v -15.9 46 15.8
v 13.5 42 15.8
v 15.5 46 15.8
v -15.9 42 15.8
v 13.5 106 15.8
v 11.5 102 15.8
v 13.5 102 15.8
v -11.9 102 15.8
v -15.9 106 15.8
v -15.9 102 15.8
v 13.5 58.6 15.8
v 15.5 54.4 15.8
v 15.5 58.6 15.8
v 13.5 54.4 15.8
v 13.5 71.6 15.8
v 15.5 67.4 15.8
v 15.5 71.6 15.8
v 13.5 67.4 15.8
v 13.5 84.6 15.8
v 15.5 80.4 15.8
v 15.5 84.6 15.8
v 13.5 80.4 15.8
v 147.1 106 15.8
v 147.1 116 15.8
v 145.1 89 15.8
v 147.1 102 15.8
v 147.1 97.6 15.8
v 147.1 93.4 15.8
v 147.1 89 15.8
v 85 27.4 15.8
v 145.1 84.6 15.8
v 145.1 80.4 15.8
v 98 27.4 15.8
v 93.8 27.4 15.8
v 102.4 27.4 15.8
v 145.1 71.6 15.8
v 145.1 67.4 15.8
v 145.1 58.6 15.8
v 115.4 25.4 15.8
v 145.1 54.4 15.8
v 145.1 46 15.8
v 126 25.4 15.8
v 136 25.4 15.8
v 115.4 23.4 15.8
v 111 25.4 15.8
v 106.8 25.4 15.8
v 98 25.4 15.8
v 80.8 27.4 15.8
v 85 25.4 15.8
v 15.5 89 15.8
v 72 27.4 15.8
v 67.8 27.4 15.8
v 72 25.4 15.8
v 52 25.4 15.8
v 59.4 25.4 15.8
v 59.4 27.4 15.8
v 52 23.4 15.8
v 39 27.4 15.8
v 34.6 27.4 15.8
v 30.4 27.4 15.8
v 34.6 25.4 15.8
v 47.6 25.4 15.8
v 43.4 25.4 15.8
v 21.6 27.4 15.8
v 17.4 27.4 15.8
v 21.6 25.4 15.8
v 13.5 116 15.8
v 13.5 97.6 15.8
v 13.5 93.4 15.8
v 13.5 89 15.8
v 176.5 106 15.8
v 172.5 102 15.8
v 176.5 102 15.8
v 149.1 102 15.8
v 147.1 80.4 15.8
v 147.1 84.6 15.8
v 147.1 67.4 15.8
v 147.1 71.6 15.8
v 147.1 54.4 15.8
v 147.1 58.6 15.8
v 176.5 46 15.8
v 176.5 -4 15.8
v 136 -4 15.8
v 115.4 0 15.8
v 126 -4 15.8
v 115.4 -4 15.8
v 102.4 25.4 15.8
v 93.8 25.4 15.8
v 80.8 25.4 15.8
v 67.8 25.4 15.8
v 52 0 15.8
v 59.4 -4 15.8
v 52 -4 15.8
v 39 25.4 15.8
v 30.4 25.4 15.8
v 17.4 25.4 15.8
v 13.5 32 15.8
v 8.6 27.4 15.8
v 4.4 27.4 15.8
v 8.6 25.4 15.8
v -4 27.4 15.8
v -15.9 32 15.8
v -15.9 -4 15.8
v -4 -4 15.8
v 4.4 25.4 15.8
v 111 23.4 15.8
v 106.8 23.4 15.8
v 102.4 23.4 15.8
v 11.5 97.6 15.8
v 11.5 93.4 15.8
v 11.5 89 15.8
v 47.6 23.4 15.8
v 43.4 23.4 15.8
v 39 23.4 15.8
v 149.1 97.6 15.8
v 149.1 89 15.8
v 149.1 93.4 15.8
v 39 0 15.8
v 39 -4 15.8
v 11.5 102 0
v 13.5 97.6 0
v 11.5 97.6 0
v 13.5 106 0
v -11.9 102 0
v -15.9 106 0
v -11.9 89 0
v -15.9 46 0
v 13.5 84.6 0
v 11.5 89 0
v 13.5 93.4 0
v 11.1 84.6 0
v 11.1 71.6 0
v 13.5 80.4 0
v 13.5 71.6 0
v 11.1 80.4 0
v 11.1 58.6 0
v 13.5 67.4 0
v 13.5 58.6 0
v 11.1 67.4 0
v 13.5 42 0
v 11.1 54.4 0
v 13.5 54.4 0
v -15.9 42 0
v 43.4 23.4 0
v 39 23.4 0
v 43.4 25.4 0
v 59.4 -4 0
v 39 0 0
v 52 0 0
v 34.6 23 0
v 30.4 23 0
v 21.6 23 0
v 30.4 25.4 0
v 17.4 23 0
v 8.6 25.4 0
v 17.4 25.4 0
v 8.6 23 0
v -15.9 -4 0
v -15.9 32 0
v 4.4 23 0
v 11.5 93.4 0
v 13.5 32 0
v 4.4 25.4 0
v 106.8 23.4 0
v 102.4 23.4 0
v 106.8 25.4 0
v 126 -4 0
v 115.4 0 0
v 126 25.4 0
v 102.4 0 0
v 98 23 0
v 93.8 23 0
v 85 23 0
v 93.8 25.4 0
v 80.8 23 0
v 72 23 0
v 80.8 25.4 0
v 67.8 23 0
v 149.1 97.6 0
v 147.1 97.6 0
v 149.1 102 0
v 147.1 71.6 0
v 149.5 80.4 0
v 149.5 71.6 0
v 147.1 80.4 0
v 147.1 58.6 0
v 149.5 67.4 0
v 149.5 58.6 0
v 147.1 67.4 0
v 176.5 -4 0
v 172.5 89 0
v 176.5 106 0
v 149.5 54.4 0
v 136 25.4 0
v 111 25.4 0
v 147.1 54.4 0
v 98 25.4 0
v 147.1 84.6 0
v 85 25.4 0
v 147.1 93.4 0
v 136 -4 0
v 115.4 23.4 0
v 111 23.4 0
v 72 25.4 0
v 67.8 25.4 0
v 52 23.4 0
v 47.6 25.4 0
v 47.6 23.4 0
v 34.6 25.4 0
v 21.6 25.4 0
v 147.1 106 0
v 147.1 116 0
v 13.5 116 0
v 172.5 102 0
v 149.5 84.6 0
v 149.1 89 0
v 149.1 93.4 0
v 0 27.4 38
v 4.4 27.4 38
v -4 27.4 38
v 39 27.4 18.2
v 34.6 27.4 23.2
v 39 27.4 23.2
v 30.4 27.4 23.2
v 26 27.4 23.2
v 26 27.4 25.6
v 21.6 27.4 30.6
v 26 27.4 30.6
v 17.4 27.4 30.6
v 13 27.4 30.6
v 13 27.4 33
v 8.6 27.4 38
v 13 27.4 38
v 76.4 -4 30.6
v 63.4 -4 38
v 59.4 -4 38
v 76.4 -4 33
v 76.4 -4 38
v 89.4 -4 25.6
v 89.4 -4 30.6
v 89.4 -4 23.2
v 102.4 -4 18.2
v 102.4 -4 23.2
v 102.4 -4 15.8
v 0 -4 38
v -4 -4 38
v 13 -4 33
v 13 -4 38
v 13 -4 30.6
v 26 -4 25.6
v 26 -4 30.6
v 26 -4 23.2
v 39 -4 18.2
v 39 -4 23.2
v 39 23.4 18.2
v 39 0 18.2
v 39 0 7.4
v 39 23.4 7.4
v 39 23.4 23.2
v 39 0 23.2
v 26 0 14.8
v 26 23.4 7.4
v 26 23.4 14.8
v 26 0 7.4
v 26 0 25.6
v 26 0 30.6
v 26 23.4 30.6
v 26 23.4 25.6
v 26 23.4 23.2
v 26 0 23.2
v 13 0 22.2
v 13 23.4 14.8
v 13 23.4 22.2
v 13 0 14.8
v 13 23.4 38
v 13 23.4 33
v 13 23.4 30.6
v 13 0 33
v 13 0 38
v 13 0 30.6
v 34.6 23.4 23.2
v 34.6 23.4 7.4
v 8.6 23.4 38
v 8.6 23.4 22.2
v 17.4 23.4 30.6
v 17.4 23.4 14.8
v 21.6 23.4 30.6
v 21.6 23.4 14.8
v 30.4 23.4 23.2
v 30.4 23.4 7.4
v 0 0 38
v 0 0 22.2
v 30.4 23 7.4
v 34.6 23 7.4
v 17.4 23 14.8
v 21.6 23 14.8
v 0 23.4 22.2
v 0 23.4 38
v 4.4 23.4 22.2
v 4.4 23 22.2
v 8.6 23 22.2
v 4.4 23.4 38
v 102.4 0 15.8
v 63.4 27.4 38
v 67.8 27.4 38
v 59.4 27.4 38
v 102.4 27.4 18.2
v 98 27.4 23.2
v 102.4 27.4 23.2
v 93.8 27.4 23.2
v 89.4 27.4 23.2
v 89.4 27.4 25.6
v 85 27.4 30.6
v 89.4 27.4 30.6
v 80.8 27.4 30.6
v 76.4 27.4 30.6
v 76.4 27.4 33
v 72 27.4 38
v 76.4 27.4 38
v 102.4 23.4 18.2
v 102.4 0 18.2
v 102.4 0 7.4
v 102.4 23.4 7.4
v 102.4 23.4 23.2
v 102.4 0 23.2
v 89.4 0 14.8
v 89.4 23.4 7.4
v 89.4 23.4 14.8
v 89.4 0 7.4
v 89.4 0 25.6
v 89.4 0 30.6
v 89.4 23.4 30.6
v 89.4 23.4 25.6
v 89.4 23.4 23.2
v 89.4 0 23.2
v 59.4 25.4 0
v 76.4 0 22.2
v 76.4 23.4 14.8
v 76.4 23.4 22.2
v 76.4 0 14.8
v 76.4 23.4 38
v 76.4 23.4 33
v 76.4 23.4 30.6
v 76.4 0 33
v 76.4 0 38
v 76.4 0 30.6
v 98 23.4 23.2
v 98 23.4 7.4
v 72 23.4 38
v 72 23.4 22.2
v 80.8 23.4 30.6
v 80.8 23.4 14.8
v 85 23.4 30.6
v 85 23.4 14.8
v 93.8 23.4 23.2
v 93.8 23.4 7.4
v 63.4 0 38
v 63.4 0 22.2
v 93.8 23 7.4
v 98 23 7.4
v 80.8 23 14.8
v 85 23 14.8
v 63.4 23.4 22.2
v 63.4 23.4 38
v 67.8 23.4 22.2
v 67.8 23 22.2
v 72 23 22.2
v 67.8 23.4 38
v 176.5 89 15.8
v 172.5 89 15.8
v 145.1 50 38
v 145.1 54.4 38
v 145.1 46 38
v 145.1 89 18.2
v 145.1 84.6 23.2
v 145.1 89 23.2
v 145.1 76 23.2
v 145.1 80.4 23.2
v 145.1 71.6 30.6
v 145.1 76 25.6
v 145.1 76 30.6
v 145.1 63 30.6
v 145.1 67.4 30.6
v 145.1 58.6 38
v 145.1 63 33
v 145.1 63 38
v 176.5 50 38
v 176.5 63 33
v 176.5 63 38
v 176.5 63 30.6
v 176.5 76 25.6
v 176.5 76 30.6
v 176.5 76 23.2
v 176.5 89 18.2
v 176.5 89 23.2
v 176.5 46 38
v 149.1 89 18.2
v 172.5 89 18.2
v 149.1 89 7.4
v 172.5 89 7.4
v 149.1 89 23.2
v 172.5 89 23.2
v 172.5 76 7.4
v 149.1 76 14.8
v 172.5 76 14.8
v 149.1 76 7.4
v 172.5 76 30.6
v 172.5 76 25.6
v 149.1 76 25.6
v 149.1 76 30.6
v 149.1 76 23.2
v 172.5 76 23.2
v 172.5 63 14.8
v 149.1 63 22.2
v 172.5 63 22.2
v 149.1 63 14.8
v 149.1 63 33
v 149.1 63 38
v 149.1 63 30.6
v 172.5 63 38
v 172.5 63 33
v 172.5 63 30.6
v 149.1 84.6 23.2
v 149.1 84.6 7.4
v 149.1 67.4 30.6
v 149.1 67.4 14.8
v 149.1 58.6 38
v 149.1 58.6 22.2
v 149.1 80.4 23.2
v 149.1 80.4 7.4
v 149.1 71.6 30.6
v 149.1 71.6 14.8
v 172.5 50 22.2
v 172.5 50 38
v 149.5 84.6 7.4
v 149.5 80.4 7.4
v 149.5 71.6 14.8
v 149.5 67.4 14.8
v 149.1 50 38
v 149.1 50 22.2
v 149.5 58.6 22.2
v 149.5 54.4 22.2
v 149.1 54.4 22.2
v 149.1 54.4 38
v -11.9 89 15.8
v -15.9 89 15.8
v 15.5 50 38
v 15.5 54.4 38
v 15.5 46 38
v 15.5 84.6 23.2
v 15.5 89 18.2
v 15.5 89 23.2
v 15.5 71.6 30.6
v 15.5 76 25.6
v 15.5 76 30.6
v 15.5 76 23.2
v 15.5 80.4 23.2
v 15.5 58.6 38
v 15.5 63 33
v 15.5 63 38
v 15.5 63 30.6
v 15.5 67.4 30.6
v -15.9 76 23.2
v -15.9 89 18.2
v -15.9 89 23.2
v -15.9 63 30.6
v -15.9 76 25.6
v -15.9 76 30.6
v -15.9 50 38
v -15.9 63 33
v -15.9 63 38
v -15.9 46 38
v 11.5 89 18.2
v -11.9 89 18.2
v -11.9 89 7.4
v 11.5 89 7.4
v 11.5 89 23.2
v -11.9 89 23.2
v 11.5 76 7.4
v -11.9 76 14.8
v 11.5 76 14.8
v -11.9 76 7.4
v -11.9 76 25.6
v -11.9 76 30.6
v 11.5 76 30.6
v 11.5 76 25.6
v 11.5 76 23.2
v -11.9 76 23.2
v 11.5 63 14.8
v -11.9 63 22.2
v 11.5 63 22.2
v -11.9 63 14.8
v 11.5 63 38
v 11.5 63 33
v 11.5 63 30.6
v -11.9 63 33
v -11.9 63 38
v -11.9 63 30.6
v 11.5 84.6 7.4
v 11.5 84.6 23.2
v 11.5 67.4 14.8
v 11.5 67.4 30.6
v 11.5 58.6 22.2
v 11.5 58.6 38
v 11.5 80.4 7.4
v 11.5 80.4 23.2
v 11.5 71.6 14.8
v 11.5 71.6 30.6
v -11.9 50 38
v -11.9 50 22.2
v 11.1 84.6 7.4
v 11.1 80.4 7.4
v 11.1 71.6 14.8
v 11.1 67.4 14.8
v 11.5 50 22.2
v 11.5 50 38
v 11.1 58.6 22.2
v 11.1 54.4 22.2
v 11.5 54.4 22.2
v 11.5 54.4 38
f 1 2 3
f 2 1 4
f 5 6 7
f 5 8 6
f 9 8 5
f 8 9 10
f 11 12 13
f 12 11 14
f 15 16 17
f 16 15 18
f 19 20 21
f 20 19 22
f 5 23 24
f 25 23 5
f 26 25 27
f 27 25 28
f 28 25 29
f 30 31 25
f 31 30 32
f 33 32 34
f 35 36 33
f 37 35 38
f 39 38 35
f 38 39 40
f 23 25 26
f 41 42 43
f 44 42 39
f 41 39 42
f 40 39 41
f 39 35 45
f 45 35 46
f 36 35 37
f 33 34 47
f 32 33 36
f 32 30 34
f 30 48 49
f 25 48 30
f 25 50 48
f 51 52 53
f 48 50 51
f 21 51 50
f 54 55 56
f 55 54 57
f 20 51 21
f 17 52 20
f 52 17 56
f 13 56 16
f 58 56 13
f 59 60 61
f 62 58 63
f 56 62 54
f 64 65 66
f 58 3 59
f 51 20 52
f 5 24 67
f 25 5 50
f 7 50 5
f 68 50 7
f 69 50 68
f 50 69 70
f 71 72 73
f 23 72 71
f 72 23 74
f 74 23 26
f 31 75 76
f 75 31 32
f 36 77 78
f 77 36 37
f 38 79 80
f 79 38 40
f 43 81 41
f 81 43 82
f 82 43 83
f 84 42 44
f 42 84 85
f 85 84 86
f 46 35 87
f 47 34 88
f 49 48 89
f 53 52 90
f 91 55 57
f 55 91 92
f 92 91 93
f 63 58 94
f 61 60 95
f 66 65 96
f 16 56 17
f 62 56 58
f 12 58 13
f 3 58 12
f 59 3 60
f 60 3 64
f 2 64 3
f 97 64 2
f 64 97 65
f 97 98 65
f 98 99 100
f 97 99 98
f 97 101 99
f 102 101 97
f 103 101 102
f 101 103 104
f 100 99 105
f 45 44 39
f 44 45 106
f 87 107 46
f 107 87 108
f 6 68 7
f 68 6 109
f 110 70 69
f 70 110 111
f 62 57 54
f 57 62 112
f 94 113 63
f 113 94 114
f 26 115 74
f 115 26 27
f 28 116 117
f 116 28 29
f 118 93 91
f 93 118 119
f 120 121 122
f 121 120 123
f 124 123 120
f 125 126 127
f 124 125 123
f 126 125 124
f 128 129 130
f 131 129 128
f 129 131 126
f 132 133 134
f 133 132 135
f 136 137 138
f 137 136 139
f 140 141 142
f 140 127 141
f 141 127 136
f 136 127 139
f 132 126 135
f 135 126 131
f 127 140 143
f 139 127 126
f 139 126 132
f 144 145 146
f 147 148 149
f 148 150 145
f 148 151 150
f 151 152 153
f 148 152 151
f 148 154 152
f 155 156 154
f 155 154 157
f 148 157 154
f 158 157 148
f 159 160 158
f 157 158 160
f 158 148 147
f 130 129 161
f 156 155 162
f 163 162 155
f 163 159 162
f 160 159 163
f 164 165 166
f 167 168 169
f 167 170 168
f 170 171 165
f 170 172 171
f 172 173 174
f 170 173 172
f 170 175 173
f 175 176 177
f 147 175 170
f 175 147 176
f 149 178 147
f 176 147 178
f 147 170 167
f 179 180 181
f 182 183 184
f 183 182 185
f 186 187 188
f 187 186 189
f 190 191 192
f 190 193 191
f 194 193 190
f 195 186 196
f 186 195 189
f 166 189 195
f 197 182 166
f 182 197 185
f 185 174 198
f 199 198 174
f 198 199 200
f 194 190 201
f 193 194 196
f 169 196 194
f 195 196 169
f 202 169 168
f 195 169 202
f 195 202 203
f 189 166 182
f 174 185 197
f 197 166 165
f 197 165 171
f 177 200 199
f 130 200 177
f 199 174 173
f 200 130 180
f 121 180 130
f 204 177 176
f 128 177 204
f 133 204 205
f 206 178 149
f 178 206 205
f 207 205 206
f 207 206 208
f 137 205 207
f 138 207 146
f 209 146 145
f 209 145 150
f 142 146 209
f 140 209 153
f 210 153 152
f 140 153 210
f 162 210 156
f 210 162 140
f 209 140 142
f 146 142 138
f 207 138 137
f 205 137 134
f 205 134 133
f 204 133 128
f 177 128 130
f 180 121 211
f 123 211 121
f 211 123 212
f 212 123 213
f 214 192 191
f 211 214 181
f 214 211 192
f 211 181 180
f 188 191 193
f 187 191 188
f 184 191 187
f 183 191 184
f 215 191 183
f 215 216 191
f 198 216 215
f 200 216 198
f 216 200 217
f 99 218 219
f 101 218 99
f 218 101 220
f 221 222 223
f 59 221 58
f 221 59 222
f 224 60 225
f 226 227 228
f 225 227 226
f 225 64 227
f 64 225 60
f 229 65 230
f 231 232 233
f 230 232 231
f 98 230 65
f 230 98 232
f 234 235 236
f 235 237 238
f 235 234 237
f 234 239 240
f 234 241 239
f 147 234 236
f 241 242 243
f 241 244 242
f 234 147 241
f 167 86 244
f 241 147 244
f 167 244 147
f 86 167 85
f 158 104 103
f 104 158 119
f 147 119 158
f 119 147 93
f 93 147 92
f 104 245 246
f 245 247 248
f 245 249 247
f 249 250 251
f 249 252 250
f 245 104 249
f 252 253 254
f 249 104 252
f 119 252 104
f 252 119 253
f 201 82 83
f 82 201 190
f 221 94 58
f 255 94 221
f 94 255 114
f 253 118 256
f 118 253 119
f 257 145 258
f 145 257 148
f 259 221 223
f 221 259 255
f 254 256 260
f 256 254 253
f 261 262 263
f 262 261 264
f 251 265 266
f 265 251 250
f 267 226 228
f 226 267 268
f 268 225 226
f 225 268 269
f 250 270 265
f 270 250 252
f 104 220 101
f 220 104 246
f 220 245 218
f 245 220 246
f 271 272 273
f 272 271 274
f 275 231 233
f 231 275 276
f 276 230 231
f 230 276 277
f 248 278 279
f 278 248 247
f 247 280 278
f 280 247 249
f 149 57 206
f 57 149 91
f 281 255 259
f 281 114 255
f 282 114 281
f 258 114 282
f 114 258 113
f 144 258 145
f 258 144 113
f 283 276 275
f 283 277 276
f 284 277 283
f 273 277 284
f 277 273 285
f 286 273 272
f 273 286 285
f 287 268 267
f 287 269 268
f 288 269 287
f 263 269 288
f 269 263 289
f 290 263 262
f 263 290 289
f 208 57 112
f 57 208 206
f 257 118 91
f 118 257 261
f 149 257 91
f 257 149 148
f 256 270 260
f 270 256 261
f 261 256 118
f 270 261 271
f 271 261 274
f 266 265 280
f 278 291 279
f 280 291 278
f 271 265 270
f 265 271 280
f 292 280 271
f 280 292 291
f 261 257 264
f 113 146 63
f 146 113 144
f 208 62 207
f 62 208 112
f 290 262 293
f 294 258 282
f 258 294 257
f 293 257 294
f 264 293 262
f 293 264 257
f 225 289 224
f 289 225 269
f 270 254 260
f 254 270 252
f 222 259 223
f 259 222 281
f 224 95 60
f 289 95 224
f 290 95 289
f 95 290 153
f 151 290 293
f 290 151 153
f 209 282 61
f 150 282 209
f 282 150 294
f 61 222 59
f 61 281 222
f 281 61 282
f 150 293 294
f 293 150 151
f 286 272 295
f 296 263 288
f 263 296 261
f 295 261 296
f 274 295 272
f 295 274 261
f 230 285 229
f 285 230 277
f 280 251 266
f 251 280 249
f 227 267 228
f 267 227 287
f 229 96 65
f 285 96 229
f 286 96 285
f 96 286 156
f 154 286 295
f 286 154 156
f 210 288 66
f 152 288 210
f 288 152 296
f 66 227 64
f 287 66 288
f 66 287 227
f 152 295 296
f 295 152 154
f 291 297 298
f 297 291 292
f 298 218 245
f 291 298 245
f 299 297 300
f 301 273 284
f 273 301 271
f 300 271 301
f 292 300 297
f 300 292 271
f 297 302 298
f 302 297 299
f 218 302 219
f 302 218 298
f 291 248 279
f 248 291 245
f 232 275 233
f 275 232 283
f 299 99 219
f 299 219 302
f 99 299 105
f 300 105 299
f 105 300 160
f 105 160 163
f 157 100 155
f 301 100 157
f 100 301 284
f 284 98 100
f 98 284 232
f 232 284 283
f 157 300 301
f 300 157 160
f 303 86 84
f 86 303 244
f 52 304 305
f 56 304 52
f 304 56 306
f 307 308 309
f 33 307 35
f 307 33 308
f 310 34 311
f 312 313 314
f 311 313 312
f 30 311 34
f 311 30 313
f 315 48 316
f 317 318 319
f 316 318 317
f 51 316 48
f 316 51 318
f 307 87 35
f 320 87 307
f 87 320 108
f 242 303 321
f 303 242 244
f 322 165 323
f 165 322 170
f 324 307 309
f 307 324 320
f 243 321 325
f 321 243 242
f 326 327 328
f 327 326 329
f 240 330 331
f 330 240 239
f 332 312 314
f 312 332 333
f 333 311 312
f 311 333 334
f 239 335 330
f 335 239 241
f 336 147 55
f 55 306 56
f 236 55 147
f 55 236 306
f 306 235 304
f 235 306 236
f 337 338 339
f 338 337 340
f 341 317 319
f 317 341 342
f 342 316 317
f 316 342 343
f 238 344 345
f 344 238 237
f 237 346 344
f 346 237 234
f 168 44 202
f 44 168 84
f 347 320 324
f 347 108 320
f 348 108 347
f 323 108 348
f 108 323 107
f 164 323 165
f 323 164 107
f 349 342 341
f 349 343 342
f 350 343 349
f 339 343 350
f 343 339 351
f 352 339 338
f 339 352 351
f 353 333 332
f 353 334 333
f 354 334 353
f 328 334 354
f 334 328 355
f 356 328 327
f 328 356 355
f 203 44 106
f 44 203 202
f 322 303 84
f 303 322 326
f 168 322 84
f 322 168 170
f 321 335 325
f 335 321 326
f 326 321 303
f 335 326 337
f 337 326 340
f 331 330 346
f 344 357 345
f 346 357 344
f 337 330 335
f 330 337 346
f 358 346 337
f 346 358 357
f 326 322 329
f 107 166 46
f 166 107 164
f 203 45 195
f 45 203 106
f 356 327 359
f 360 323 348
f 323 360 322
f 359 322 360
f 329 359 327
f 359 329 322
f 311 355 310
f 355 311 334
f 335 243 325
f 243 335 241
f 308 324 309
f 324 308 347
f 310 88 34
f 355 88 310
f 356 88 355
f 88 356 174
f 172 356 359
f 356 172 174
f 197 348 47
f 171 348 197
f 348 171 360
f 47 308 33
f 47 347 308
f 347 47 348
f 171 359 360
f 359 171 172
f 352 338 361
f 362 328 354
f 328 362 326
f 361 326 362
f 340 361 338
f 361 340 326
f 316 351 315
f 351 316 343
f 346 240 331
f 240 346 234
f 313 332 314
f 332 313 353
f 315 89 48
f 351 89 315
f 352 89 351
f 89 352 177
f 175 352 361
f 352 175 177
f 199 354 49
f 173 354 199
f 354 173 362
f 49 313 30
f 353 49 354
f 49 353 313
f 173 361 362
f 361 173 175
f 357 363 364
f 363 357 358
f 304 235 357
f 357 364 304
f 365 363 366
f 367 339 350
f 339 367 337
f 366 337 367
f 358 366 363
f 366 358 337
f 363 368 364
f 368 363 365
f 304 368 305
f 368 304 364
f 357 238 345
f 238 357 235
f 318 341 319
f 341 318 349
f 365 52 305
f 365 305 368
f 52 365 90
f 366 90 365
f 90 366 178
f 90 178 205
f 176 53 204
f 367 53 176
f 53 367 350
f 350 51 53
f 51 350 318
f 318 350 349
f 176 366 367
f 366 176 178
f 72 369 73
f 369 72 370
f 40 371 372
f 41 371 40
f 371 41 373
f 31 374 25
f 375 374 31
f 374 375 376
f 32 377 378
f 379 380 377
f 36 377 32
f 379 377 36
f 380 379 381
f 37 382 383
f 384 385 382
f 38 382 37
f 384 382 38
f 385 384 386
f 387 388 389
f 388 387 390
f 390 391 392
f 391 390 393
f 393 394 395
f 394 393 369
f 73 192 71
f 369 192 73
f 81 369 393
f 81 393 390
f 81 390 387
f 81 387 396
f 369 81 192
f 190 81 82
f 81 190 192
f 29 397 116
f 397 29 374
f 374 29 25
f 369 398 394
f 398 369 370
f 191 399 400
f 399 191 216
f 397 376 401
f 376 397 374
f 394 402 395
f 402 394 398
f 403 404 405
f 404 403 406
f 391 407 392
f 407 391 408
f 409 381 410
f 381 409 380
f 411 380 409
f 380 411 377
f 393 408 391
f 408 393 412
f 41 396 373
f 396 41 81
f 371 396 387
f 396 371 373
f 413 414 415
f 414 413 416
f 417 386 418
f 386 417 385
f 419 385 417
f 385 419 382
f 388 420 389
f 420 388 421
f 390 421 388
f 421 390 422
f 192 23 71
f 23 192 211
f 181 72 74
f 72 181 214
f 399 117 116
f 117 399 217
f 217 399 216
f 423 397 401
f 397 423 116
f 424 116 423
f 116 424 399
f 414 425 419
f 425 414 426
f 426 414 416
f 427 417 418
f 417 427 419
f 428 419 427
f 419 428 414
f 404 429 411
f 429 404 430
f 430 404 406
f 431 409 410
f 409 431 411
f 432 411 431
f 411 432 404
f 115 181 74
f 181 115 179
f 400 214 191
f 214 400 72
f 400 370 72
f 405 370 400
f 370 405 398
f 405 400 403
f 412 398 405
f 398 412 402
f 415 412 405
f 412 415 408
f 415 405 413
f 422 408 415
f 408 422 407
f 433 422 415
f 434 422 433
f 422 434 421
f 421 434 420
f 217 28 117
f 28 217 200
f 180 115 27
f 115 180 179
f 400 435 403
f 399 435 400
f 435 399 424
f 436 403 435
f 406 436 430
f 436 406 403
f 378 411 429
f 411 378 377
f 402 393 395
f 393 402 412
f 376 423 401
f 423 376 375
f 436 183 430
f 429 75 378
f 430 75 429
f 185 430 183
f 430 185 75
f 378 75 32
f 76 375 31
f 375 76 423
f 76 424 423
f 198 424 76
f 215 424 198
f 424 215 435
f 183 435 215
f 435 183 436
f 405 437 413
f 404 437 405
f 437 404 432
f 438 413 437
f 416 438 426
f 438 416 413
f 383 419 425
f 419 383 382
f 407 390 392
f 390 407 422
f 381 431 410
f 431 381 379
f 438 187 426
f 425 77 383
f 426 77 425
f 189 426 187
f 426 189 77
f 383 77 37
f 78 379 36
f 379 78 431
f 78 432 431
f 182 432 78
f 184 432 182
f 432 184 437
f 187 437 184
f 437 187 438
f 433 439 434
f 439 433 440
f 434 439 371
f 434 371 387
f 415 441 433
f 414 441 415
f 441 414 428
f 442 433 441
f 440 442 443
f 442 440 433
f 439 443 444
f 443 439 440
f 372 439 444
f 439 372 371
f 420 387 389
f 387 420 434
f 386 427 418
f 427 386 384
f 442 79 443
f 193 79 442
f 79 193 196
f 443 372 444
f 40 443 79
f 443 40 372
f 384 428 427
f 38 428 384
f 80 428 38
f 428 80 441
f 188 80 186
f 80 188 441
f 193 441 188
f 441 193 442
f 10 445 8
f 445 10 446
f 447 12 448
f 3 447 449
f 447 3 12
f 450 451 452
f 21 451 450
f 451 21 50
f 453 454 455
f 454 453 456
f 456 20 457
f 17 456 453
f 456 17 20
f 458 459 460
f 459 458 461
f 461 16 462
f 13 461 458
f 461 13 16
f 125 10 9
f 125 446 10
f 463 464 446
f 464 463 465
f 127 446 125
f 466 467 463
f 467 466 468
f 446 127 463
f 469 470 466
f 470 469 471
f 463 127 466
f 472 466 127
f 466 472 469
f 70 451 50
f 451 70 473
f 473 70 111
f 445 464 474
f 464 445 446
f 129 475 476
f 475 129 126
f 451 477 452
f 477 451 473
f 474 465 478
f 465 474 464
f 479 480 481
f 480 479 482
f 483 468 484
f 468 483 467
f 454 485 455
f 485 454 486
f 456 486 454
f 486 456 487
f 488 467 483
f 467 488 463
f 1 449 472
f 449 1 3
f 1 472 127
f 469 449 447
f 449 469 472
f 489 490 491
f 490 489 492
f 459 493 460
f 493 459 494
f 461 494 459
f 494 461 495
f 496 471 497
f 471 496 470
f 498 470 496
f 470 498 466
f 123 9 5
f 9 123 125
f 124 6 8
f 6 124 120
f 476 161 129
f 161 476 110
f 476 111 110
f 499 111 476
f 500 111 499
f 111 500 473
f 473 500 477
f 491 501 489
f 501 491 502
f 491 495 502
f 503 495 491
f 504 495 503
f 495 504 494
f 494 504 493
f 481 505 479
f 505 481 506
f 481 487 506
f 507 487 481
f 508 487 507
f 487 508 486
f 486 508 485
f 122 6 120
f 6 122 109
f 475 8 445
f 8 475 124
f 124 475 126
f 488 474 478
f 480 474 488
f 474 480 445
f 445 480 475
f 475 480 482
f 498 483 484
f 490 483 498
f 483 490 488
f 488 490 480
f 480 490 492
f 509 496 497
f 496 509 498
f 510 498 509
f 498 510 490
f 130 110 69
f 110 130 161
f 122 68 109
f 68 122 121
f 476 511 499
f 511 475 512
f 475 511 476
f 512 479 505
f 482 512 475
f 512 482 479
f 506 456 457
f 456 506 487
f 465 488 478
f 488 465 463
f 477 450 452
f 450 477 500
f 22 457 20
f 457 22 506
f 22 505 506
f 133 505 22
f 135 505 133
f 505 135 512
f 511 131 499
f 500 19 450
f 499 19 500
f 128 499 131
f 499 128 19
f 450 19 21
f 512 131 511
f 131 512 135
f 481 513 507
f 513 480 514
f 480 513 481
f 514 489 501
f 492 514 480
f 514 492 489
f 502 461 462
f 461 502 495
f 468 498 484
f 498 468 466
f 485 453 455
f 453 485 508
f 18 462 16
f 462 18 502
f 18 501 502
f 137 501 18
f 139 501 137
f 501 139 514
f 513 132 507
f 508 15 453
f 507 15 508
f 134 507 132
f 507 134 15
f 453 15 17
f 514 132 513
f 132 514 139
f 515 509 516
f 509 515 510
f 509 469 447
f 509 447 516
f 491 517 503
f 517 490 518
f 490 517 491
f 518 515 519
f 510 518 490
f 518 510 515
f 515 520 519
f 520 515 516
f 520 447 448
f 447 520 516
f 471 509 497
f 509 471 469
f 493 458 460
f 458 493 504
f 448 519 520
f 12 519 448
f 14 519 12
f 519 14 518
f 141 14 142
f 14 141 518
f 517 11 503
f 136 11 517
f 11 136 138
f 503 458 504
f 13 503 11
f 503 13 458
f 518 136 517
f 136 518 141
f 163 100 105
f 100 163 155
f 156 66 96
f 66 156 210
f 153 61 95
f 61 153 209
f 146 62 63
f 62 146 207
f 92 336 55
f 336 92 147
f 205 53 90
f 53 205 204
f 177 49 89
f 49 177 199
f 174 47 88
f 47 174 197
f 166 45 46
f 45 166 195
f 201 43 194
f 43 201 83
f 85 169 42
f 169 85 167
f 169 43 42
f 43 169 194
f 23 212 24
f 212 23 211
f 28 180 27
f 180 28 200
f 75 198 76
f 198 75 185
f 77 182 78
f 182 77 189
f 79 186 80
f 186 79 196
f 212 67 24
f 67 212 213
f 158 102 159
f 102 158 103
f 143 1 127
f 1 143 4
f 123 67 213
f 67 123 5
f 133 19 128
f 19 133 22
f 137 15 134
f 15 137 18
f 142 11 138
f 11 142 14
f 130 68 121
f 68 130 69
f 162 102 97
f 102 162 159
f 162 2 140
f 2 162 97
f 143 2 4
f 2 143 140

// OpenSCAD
// file: line.scad
//cube([100,100,15.8]);

servoW=12.6+0.4;
servoH=23.0+0.4;
    waku=4;

module servo(){
    cube([12.6+0.4,23.0+0.4,26.7]);
    translate([0,(23.0-32.4)/2,15.8])
    cube([12.6+0.4,32.4,2.4]);
    translate([(13-4.2)/2,23,-100])
    cube([4.2,5,18+100]);
}

module servo4_0(){
translate([servoW*4,0,0])
scale([-1,1,1])
    for(i = [0:3]){
        translate([i*13,0,(2.4+5)*i]){
            servo();
        }
    }
}

module servo4(){
translate([servoW*4,0,0])
scale([-1,1,1])
difference(){
union(){
    translate([-waku,-waku,0])
    cube([waku,waku*2+servoH,15.8]);
    translate([0,-waku,0]){
    for(i = [0:3]){
        translate([i*13,0,0]){
            cube([waku+servoW,waku*2+servoH,15.8+(2.4+5)*i]);
        }
    }
    }
}


union(){
    for(i = [0:3]){
        translate([i*13,0,(2.4+5)*i]){
            servo();
        }
    }
    
}
}
}

module servo4_rect(l=servoW*4+waku*2){
    translate([-waku,-waku,0])
    cube([l,servoH+waku+2,15.8]);

}


module hikkake(l=servoW*4,d=10){
    for(i=[0:4]){
        translate([-waku,waku+servoH,(2.4+5)*i+15.8+2.4])
        cube([l,d,2]);  
    }

}

//servo4_0();
//servo();
//hikkake();
//

//for(i=[0:4]){
//translate([-waku,waku+servoH,(2.4+5)*i+15.8+2.4])
//cube([servoW*4,10,2]);
//}
//translate([-waku,waku+servoH,(2.4+5)+15.8+2.4])
//cube([servoW*2+waku,10,2]);
//translate([-waku,waku+servoH,(2.4+5)*2+15.8+2.4])
//cube([servoW+waku,10,2]);
//
//translate([100,0,0])
//servo4_rect();
//
//translate([0,50,0])
//servo4_rect();
// main file
include<line.scad>


//bottom
servo4();
translate([63.4,0,0])
servo4();

translate([172.5,50,0])
rotate([0,0,90])
servo4();

translate([-11.9,50,0])
rotate([0,0,-90])
scale([-1,1,1])
servo4();

difference(){
    translate([-waku-11.9,-waku,0])
    cube([184.4+waku*2,120,15.8]);
    
    union(){
        servo4_rect();
        translate([63.4,0,0])
        servo4_rect();
        
        translate([130,0,0])
        servo4_rect(l=10);

        translate([172.5,50,0])
        rotate([0,0,90])
        servo4_rect();

        translate([172.5,110,0])
        rotate([0,0,90])
        servo4_rect(l=10);

        translate([-11.9,50,0])
        rotate([0,0,-90])
        scale([-1,1,1])
        servo4_rect();
        
        translate([-11.9,40-waku,0])
        rotate([0,0,-90])
        scale([-1,1,1])
        servo4_rect(l=10);
        
        translate([-11.9,110,0])
        rotate([0,0,-90])
        scale([-1,1,1])
        servo4_rect(l=10);
        
    }
}
